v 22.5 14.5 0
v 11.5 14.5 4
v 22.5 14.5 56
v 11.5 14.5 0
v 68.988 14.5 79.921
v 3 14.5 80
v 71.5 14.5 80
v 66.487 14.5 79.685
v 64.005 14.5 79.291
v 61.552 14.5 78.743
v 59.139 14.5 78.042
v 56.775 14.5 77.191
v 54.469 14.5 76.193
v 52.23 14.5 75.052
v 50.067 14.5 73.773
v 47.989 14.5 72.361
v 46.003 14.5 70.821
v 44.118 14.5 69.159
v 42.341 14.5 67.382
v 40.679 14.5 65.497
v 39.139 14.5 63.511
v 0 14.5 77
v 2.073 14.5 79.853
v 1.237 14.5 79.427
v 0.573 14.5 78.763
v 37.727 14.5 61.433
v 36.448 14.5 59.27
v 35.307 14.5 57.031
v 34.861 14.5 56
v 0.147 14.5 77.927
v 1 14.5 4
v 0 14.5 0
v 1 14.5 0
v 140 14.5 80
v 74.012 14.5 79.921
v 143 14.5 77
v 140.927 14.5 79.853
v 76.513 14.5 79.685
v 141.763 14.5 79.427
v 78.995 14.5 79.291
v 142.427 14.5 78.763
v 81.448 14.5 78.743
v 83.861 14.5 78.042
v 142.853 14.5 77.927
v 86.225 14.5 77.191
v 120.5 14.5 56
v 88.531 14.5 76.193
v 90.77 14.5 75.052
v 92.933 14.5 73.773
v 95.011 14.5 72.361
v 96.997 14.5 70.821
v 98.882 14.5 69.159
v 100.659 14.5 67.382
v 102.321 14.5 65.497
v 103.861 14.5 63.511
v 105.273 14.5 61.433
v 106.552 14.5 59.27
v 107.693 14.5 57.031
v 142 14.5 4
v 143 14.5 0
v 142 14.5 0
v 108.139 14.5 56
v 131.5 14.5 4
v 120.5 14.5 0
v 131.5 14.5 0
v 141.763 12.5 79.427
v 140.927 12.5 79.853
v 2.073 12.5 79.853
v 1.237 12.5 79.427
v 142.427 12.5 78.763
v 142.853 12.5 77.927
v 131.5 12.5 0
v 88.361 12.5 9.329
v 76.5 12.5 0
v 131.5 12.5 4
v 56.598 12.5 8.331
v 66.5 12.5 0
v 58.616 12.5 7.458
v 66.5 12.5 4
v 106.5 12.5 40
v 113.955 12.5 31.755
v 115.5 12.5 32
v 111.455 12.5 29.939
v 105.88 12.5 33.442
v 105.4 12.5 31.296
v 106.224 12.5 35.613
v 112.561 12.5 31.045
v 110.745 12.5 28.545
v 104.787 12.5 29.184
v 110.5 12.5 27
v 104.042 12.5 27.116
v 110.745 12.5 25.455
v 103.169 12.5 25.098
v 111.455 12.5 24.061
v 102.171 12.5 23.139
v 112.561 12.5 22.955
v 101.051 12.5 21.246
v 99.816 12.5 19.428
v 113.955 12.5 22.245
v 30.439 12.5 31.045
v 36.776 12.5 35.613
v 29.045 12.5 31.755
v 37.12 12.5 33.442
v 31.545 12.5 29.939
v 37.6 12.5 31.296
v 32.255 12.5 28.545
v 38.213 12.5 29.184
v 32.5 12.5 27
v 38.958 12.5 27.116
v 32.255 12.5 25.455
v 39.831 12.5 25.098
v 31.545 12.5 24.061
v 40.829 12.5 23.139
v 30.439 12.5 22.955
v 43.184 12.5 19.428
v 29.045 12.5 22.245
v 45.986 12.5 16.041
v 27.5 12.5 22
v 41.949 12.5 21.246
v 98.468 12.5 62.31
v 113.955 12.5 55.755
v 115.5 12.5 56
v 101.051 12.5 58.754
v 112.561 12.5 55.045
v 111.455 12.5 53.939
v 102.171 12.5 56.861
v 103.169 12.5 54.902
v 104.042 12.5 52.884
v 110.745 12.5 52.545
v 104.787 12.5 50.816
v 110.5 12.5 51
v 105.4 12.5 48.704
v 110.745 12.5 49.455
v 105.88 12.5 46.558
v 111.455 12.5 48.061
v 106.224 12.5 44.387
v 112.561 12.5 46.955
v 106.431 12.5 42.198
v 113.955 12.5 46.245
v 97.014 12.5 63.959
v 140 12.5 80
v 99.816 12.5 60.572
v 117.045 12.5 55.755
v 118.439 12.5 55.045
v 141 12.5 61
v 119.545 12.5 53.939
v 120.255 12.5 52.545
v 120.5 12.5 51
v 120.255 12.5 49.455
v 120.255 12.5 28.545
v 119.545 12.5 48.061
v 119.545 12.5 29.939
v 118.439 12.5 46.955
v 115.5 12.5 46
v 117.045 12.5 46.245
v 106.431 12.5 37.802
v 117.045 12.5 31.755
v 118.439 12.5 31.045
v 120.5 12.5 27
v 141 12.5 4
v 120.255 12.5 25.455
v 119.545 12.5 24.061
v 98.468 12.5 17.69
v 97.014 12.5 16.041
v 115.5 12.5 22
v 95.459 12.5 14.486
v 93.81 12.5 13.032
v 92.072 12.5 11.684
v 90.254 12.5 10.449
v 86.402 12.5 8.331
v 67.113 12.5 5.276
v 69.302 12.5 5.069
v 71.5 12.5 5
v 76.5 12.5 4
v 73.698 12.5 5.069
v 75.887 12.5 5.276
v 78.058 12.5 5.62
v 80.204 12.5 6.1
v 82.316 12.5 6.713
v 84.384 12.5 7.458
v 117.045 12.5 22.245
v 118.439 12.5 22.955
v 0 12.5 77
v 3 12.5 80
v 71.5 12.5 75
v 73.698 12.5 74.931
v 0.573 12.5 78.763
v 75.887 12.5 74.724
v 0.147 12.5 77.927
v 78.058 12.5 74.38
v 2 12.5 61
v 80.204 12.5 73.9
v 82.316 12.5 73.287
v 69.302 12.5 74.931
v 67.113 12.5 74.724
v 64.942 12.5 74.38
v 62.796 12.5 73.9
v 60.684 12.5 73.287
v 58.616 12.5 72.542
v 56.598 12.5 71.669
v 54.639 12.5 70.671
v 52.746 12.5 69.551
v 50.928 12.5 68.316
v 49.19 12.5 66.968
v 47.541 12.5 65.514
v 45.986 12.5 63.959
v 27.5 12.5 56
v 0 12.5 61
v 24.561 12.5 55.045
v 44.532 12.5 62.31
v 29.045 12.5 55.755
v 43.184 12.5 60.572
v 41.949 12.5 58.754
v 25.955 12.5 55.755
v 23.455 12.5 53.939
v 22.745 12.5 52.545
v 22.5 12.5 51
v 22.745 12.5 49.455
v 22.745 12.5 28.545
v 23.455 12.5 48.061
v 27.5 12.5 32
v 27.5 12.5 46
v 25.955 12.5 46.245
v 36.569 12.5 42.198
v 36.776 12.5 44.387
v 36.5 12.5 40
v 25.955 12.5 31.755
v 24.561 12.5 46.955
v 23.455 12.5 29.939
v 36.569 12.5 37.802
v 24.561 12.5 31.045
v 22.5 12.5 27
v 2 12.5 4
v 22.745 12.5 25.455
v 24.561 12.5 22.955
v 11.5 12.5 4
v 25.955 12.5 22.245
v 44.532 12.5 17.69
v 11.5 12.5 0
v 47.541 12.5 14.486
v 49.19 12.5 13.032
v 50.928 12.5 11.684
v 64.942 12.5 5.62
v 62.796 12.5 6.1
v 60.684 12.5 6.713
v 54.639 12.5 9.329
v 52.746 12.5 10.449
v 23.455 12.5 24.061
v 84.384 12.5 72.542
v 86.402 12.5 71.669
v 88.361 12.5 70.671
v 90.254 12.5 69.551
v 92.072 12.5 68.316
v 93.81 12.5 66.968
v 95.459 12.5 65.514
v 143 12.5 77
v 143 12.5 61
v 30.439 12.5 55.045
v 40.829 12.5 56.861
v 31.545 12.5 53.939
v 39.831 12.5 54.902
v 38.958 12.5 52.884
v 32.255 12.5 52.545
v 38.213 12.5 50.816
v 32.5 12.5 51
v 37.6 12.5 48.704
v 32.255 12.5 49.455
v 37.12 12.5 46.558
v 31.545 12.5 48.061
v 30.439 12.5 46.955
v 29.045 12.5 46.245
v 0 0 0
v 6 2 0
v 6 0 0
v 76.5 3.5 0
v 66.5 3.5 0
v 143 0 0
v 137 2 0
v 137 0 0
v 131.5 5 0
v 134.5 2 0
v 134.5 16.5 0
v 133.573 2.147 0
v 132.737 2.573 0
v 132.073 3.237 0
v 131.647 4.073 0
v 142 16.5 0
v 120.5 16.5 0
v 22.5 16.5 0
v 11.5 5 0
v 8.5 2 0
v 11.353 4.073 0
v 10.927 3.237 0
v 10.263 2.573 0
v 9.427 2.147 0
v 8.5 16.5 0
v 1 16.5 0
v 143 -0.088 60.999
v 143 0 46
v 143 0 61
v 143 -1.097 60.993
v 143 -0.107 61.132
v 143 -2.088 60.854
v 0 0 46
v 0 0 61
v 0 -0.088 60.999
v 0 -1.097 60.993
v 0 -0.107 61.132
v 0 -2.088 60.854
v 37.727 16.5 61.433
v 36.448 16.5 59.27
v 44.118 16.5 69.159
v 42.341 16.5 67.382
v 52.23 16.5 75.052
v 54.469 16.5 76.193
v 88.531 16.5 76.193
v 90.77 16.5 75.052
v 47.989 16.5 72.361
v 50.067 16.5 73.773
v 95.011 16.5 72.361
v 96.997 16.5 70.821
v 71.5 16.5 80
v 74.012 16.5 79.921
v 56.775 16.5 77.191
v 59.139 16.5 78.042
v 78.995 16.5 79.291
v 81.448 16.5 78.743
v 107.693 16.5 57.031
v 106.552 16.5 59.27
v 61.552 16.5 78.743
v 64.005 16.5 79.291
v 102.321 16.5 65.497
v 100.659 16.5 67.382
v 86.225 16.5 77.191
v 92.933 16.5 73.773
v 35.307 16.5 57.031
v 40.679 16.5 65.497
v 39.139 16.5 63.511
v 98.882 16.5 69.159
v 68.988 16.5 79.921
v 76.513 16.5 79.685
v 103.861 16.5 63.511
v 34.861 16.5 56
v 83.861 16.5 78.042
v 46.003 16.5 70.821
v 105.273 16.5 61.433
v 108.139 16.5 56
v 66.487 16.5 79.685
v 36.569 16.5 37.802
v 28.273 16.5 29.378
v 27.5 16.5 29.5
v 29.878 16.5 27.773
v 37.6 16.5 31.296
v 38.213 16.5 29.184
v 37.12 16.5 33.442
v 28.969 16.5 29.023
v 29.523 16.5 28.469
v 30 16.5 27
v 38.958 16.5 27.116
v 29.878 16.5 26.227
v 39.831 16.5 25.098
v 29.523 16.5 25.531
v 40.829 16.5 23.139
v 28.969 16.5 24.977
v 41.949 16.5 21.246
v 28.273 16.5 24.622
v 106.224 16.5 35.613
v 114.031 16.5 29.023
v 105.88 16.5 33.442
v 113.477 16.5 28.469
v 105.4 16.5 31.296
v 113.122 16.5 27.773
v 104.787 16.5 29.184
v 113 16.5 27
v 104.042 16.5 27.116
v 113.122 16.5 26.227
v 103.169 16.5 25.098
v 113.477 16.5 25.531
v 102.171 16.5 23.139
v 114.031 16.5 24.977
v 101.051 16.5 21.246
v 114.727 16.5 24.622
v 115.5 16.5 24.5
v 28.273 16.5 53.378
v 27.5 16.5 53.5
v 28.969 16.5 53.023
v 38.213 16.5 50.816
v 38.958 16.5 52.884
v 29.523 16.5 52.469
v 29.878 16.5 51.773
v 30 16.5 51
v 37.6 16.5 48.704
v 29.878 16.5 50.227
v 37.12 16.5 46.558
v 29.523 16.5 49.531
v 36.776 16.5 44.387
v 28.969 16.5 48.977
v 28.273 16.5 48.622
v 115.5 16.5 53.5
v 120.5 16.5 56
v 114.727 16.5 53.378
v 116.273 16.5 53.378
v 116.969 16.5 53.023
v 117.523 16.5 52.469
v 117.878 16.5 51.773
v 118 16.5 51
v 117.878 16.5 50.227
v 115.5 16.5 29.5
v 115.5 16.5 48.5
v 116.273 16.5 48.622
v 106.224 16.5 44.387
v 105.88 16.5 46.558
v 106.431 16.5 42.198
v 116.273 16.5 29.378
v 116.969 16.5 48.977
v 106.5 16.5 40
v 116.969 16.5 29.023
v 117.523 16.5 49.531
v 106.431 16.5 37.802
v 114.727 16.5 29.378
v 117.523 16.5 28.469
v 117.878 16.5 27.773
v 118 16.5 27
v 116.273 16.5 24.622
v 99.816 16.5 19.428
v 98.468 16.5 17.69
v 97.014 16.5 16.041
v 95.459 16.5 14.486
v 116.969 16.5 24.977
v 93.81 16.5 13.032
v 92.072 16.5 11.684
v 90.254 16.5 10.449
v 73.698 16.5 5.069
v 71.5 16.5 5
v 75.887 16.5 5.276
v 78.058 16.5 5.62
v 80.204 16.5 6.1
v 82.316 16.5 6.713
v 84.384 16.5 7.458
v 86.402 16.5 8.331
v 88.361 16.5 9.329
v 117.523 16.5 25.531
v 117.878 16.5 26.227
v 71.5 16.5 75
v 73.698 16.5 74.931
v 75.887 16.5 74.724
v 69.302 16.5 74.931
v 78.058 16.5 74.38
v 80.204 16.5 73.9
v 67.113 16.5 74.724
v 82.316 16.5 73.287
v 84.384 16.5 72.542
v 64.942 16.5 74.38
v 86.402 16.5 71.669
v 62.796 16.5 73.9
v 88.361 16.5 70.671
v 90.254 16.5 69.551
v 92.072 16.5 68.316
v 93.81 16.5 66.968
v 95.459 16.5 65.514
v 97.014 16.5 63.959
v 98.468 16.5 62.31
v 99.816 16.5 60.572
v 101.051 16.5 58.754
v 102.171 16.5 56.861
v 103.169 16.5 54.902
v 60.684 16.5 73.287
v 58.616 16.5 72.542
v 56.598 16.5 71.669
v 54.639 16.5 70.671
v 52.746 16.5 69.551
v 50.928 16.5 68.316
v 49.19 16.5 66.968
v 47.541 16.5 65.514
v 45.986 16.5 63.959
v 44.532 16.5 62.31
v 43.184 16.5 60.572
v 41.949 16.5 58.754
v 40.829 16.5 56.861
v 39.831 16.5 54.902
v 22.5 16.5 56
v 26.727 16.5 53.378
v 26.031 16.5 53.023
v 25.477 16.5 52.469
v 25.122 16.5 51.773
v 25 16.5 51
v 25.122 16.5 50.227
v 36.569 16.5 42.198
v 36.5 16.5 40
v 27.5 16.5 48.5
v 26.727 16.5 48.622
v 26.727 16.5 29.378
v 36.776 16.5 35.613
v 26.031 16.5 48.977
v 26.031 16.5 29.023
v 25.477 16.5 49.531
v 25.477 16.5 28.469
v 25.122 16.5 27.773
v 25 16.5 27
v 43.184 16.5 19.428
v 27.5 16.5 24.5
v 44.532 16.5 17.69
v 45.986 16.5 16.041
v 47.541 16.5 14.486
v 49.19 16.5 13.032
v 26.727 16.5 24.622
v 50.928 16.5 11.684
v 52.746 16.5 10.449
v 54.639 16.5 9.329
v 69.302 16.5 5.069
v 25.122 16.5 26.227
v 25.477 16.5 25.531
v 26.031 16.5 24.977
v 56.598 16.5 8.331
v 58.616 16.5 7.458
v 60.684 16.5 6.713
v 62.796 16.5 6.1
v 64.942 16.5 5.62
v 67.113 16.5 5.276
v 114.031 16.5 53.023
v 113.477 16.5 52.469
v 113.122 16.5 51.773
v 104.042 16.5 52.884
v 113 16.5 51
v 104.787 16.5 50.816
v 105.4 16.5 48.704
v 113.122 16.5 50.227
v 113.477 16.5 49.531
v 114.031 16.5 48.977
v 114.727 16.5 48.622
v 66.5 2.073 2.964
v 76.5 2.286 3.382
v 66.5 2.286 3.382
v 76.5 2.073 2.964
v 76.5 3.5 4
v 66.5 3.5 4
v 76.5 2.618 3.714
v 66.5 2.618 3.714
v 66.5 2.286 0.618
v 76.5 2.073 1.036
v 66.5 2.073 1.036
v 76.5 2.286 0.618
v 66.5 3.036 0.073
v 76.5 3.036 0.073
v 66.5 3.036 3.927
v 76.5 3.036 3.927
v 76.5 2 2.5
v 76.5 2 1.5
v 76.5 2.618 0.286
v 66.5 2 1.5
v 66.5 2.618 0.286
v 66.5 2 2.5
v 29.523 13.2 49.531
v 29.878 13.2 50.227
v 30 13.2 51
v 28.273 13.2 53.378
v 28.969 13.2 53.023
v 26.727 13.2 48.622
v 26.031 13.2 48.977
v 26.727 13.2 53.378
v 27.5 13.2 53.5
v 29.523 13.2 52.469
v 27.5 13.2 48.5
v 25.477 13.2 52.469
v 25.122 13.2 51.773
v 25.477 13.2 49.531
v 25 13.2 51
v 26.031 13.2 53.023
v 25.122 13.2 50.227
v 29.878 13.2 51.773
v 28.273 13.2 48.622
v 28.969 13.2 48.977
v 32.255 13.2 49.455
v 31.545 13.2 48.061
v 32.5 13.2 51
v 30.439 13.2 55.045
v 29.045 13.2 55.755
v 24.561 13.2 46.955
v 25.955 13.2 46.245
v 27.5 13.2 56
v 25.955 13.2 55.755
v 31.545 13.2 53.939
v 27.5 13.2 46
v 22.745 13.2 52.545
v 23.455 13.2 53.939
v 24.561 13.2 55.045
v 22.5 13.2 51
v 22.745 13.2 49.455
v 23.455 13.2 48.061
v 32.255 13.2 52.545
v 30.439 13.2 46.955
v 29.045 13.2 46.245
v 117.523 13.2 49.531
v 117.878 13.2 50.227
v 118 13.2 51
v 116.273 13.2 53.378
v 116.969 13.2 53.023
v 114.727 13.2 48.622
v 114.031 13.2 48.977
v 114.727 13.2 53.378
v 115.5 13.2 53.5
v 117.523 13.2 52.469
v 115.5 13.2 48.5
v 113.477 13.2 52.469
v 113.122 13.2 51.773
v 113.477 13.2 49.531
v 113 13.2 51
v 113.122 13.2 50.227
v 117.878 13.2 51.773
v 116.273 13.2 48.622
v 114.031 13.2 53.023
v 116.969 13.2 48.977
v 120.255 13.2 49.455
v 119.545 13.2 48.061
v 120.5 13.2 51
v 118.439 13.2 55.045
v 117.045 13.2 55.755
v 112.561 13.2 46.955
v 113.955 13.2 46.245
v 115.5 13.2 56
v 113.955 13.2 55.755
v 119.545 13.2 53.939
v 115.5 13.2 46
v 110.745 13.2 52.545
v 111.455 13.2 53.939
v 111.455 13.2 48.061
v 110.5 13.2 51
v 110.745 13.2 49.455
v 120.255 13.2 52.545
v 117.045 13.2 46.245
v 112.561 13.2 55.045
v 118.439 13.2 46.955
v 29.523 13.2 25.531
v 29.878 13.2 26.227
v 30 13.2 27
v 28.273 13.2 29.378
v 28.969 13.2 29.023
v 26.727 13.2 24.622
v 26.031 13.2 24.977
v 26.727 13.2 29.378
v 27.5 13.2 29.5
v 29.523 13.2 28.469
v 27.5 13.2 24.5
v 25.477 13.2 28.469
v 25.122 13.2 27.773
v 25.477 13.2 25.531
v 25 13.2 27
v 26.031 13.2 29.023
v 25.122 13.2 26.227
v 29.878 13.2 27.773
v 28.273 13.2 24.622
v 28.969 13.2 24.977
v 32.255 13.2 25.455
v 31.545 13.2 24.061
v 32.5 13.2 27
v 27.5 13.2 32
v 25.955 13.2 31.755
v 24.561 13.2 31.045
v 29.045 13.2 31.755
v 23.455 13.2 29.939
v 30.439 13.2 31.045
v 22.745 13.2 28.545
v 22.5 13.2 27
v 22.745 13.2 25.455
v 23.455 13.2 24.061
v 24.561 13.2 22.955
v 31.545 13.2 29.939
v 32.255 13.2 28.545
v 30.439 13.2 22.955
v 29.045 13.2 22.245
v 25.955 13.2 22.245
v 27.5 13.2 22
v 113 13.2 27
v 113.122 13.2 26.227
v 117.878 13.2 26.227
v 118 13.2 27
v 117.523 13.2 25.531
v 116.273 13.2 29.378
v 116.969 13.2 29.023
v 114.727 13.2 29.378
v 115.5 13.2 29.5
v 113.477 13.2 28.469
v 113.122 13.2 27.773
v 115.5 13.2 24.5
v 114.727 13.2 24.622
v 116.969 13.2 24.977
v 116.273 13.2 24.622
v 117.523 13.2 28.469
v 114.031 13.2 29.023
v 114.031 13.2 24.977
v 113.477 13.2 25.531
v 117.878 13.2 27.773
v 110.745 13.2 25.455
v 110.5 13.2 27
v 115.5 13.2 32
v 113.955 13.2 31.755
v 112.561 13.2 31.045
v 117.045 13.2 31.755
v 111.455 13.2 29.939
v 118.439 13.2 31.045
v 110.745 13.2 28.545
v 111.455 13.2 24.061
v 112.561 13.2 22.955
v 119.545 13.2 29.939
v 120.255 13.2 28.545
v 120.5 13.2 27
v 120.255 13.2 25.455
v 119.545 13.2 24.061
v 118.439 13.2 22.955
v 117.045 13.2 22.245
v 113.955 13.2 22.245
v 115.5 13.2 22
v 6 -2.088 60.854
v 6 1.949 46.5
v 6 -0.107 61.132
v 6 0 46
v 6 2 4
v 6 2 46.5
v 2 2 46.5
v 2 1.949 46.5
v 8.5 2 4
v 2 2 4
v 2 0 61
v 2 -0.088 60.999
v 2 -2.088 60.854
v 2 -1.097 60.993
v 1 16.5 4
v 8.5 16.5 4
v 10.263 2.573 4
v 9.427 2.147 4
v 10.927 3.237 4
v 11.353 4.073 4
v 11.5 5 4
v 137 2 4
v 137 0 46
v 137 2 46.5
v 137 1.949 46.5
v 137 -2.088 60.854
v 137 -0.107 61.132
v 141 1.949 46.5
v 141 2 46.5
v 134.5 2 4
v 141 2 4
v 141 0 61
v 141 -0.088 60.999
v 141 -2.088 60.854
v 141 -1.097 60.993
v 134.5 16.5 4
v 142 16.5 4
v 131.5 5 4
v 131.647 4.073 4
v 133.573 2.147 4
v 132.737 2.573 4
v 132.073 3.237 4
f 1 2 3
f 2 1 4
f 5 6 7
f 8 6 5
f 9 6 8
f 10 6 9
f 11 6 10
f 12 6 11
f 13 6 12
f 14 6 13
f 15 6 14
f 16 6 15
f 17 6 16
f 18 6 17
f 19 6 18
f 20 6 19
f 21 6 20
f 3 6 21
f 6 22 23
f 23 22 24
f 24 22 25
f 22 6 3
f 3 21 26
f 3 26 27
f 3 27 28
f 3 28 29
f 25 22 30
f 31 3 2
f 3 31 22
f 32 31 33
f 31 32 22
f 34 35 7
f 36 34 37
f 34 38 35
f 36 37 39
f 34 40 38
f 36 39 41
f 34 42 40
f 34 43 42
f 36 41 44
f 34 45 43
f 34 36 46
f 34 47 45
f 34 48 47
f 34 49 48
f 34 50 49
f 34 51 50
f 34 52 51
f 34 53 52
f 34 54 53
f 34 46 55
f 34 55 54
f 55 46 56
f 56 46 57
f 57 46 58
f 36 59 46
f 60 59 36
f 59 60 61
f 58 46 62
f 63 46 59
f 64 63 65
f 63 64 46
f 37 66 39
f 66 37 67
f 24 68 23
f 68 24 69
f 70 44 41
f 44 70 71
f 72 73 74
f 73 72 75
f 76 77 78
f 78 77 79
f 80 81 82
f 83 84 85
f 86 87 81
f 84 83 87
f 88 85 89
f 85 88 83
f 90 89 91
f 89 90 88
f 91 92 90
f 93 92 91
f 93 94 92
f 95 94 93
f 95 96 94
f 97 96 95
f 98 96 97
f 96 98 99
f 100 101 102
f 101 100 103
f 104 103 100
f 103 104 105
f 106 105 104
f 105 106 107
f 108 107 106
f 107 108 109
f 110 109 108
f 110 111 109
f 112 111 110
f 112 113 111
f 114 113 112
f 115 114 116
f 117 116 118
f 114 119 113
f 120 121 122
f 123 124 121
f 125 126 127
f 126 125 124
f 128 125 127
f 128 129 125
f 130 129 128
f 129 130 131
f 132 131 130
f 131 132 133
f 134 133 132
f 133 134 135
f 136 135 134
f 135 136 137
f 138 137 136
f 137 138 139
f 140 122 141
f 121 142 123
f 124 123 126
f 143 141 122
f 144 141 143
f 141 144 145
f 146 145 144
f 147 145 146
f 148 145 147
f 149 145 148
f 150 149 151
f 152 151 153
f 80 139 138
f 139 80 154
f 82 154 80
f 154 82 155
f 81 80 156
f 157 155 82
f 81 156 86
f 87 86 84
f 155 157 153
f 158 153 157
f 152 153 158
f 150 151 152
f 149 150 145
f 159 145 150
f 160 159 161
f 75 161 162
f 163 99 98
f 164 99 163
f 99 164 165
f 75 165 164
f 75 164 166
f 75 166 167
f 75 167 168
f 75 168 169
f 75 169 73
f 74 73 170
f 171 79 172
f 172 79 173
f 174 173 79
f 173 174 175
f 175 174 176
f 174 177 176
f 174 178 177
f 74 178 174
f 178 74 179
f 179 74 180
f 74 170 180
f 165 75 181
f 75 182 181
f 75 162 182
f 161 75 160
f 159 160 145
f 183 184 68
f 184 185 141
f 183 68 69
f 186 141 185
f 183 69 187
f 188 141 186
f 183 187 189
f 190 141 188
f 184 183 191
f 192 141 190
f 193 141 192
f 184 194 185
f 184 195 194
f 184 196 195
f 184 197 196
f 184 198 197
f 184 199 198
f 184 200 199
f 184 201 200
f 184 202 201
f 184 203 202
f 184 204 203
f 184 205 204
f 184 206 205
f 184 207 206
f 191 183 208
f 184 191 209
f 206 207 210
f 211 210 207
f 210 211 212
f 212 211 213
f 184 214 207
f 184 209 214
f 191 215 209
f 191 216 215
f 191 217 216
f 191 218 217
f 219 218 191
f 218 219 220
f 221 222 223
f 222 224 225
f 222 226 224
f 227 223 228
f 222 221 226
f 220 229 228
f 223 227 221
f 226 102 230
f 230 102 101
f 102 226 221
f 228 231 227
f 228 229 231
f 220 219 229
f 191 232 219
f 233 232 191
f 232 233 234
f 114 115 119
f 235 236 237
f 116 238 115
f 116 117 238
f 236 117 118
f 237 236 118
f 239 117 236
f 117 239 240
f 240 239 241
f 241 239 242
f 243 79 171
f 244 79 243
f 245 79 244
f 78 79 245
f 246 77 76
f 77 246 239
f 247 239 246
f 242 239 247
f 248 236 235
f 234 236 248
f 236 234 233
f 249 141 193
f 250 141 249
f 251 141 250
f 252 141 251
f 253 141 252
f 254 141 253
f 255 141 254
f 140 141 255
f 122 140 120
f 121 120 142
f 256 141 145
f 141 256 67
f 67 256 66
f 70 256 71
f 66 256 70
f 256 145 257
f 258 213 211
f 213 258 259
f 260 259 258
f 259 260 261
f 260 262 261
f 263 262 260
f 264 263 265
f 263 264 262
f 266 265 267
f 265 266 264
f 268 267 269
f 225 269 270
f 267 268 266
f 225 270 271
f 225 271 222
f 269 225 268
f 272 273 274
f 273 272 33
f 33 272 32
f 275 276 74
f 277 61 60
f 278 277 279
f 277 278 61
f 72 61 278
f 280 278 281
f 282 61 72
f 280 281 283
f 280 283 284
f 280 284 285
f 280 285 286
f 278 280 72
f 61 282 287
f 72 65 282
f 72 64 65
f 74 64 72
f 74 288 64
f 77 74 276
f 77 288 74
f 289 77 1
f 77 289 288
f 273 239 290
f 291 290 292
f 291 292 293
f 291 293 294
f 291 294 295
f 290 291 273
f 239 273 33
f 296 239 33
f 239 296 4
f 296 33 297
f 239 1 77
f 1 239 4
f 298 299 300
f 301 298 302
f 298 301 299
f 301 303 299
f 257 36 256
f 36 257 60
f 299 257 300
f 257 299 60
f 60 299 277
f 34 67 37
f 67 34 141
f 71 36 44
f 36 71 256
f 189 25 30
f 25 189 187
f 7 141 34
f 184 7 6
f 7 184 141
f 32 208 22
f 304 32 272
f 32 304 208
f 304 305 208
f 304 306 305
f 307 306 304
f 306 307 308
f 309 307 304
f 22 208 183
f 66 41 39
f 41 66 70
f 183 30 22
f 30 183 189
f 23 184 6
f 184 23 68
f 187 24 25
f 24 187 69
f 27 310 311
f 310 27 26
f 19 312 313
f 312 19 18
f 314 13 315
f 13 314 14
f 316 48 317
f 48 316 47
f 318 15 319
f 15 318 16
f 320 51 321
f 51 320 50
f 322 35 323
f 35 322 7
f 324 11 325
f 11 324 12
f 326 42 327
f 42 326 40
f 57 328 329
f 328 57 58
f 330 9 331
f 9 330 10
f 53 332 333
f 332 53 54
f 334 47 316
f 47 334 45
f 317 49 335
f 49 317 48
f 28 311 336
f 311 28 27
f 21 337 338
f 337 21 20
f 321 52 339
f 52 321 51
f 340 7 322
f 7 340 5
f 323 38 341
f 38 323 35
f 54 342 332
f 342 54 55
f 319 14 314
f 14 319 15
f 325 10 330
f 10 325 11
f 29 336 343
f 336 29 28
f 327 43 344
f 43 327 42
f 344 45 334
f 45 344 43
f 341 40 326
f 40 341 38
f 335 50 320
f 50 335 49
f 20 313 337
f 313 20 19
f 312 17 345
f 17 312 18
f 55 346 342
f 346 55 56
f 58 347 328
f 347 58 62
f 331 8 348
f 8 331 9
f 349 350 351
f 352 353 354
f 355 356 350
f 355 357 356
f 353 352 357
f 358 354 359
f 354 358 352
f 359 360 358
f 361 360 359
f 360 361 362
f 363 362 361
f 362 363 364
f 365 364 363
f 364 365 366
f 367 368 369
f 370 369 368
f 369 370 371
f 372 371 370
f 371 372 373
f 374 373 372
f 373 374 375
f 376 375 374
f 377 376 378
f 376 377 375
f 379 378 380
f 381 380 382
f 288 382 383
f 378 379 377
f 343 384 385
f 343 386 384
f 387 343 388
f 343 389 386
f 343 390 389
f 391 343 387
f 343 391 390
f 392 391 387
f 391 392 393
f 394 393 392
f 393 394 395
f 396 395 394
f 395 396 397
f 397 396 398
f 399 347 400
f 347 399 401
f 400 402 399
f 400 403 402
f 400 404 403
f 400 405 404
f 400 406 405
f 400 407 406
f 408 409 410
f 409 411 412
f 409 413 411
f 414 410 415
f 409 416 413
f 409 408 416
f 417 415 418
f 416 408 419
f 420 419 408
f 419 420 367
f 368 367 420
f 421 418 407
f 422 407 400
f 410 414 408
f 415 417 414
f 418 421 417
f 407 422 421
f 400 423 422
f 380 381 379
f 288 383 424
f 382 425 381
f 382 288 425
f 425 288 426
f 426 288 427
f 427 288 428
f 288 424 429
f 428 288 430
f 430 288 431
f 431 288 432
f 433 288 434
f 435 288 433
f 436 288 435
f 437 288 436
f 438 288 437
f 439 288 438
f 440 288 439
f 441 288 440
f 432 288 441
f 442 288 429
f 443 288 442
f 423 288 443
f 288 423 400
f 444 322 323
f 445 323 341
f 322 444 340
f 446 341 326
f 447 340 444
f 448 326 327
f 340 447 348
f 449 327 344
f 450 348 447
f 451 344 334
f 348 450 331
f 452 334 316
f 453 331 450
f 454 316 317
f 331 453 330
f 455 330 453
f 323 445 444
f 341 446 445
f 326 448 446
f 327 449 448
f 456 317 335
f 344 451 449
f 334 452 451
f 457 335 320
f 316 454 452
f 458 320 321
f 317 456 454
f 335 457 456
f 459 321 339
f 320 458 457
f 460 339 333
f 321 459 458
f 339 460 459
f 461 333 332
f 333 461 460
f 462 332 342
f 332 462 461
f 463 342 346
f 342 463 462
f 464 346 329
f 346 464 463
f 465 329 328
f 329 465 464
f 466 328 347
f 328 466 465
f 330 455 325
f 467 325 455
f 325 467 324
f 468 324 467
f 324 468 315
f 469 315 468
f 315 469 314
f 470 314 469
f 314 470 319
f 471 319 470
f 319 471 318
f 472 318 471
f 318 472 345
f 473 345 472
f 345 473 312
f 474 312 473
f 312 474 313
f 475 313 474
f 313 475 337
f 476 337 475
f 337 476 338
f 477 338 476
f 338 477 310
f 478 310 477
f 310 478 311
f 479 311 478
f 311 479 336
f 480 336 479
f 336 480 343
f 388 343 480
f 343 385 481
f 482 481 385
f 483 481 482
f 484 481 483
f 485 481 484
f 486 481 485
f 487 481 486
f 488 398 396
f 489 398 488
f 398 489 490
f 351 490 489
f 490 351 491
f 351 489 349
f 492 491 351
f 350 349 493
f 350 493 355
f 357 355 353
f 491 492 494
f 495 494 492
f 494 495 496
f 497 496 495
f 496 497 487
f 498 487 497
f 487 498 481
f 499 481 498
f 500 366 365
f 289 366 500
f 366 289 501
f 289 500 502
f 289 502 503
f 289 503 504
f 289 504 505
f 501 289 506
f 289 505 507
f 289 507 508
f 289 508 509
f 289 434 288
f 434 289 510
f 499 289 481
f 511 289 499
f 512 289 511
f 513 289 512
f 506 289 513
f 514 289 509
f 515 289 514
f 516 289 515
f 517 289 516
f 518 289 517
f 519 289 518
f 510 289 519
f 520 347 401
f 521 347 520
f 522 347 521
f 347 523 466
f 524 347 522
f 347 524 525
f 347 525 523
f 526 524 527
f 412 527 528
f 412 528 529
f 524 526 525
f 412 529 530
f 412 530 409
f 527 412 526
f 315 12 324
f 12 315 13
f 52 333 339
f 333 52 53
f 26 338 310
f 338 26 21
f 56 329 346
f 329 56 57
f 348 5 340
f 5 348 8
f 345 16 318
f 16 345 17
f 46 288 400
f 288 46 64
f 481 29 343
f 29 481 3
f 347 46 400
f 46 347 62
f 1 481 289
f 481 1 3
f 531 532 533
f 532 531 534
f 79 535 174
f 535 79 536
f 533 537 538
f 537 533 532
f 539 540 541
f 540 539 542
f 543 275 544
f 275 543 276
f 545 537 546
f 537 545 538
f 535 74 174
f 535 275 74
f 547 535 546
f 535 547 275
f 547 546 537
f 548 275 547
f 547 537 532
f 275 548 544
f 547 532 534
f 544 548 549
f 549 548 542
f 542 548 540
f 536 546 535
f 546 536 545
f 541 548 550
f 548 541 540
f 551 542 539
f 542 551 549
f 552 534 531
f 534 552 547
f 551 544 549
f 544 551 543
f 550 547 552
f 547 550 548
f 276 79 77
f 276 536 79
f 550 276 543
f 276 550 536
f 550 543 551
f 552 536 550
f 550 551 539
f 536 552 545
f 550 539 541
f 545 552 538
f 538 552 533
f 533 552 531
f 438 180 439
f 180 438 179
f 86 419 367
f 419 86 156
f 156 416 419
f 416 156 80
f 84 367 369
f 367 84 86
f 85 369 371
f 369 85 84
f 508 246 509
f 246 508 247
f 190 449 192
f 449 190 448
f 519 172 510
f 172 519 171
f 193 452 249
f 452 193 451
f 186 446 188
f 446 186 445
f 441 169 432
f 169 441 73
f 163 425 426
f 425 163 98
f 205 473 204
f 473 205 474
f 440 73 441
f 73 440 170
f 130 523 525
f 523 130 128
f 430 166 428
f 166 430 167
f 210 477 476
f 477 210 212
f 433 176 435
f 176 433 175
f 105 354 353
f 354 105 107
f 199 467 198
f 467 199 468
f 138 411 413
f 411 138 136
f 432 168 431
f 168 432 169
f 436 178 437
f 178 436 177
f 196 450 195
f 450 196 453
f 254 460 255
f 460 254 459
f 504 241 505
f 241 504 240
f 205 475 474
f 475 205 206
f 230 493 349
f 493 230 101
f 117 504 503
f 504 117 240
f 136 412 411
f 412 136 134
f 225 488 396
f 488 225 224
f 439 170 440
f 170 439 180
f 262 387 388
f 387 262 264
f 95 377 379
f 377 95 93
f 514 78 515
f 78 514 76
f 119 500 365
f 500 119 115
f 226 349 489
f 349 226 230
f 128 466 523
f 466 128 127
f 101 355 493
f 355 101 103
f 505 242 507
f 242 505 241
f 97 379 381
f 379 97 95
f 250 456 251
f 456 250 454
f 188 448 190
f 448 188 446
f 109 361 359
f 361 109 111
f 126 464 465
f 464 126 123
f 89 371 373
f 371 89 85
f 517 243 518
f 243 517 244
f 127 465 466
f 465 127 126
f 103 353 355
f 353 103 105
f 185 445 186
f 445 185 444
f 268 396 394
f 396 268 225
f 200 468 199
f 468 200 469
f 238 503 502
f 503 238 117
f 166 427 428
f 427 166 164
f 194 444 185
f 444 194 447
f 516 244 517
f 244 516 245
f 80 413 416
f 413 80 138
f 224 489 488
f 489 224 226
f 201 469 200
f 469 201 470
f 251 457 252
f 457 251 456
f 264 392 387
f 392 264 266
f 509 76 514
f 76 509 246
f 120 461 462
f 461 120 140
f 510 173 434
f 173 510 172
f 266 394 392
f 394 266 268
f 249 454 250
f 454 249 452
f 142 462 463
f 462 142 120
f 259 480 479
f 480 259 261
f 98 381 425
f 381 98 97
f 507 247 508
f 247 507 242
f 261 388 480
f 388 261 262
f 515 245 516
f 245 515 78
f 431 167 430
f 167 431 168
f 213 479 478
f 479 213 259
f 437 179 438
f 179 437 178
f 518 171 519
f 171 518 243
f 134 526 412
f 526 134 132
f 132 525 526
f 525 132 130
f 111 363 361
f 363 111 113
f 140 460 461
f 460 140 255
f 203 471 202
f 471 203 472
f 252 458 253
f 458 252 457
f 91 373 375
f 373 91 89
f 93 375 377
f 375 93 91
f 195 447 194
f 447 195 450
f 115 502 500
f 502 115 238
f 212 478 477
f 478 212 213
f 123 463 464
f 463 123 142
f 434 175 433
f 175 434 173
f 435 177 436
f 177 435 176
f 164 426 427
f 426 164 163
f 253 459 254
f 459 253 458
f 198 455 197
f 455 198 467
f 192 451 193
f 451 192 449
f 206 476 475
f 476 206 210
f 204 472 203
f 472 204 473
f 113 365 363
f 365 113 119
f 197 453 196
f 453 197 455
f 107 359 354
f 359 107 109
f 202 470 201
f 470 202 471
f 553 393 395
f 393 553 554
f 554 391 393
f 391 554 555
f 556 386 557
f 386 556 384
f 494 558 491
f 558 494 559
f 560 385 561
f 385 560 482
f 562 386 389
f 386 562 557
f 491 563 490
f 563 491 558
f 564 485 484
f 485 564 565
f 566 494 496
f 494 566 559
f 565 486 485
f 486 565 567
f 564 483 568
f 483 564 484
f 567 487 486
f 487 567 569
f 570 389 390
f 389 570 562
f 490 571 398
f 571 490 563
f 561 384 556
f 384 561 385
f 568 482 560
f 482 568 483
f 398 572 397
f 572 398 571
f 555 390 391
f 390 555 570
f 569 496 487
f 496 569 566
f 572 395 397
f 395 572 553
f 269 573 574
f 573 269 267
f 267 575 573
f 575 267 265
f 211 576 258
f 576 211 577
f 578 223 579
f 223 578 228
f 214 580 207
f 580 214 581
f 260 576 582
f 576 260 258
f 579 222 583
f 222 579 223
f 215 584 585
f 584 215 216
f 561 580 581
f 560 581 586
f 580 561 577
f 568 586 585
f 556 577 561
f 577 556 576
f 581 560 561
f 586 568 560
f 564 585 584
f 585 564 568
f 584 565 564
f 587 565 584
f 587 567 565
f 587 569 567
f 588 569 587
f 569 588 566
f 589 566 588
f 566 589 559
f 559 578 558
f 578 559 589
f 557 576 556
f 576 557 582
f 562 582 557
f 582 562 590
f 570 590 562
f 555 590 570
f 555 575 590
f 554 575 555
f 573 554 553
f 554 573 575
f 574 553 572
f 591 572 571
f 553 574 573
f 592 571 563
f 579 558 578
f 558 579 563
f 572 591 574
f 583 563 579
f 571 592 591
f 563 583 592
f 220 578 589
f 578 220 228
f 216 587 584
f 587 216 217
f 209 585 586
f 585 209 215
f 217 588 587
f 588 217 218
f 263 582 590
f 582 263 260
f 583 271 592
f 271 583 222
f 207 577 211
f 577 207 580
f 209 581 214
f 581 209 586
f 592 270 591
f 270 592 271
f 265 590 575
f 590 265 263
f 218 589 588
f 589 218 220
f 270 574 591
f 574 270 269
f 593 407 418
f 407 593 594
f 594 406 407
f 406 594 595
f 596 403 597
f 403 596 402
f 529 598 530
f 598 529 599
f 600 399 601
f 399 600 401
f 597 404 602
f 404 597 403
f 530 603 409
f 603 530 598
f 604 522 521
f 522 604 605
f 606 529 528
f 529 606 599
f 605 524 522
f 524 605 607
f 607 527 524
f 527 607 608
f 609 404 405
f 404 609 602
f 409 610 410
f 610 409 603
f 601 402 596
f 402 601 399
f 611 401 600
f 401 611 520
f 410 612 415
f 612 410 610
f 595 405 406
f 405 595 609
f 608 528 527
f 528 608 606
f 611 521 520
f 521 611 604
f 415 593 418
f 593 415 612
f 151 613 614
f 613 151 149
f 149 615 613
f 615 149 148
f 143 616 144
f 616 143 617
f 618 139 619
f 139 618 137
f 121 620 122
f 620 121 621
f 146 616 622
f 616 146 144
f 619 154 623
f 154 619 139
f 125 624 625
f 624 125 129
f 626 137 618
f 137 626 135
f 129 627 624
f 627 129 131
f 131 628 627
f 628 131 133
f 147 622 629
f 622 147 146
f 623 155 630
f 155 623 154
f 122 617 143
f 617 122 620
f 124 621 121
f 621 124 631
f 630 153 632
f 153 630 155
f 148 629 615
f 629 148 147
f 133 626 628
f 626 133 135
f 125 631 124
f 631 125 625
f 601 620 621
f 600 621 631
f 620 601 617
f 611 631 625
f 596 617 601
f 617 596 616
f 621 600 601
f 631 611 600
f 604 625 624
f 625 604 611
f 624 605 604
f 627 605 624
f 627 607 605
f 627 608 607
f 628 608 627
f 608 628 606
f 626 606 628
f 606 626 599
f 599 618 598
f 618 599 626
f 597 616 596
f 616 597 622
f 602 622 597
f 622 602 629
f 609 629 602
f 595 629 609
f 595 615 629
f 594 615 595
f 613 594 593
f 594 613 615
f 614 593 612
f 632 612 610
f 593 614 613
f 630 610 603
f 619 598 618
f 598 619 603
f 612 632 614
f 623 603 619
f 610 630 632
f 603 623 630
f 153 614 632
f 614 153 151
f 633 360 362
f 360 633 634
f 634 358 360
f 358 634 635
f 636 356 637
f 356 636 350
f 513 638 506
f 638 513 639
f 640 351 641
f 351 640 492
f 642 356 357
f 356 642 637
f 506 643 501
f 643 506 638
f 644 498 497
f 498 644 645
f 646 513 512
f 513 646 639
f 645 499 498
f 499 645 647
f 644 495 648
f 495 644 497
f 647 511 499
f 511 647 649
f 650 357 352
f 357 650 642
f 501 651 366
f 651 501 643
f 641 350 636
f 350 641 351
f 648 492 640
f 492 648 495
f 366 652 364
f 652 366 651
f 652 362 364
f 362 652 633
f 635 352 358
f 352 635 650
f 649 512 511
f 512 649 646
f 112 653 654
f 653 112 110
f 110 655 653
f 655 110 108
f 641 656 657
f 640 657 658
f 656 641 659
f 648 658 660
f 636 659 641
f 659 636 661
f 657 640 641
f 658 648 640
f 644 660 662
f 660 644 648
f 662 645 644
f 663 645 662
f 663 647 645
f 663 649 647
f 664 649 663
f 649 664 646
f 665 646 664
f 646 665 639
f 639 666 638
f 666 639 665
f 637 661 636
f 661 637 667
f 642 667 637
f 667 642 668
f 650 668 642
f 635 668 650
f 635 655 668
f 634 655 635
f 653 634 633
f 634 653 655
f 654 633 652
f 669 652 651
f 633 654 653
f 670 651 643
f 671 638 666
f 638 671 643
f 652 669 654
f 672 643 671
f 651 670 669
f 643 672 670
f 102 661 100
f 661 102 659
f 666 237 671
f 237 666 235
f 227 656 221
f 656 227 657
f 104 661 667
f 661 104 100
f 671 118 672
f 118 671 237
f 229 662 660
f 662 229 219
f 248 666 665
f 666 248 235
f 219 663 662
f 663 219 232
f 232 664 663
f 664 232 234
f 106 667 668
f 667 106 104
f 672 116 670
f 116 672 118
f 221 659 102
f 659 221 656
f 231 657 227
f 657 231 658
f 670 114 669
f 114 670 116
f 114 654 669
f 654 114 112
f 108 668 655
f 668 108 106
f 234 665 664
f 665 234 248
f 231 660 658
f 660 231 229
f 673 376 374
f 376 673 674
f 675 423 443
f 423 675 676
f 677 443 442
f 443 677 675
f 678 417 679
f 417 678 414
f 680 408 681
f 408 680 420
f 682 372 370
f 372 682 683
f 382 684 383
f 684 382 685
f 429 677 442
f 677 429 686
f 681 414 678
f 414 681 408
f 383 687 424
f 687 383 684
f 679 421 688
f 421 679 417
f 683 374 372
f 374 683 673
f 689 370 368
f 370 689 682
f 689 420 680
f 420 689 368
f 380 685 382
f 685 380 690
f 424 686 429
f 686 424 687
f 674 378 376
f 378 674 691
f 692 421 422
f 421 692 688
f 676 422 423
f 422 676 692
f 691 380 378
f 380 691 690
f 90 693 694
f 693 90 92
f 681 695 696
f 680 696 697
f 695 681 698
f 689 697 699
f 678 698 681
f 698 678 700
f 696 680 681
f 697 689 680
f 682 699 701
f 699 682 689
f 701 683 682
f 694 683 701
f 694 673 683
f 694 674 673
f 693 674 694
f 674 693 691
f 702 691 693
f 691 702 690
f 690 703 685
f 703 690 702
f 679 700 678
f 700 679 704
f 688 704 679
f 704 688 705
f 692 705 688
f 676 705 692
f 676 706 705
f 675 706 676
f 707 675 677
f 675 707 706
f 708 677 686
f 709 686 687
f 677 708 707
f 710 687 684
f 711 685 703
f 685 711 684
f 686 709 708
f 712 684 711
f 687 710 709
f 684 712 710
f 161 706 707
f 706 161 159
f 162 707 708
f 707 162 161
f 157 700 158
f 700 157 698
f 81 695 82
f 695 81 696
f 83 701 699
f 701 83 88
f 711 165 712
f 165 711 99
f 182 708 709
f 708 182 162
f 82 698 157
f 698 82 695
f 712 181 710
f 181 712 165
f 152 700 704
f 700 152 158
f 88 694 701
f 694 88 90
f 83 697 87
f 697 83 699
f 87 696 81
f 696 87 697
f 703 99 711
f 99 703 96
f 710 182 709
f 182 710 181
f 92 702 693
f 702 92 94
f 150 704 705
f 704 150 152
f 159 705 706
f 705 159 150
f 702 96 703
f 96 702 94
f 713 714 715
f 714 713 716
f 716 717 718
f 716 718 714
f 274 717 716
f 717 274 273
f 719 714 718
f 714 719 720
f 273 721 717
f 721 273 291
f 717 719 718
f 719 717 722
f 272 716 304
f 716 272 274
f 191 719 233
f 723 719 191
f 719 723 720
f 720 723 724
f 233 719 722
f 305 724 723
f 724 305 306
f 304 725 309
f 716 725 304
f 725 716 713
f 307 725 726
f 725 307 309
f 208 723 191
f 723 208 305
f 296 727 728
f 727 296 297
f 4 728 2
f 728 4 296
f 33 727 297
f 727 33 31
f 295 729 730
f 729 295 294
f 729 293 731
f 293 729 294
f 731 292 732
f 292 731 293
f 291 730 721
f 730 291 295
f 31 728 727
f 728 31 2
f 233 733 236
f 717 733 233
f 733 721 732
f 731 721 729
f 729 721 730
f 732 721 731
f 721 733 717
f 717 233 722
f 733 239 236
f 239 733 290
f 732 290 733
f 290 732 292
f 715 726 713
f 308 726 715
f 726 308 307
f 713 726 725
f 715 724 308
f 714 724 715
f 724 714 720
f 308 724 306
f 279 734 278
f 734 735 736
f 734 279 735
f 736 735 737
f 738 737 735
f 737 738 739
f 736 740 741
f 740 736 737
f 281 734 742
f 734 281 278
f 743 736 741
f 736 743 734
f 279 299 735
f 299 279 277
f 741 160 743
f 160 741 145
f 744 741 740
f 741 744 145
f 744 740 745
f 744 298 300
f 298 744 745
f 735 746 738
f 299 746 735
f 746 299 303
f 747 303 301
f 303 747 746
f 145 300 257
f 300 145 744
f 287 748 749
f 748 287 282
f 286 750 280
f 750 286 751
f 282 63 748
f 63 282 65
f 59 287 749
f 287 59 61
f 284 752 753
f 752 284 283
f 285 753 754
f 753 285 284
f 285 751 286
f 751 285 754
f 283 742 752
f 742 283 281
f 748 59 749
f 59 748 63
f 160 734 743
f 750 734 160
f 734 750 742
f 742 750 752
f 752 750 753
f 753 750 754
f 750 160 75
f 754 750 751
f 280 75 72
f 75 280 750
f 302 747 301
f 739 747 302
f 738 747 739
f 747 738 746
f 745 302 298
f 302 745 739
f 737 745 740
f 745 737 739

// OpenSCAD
// Measure your phone length (round up to nearest mm)
length = 138;

// Measure your phone width (round up to nearest mm)
width=69;

// Measure your phone depth (round up to nearest mm)
depth=9;

module case(length,width,depth) {
    real_length = length + 5;
    real_width = width < 70 ? 80 : width + 10;
    real_depth = depth + 5.5;
    back(real_length, real_width, real_depth);
    side(real_width, real_depth);
    translate([real_length,0,0]) mirror([1,0,0]) side(real_width, real_depth);
}

module back(length, width, depth) {
    difference() {
        union() {
            hull() {
                translate([3,depth-2,width-3]) rotate([-90,0,0]) cylinder(2,3,3,$fn=20);
                translate([length-3,depth-2,width-3]) rotate([-90,0,0]) cylinder(2,3,3,$fn=20);
                translate([0,depth-2,0]) cube([length,2,1]);
            }
            translate([length/2,depth-2,width/2]) rotate([-90,0,0]) cylinder(4,40,40,$fn=100);
            translate([length/2-98/2,depth-2,0]) cube([98,4,width/2+16]);
            hull() {
                translate([length/2-10/2,3.5,0]) cube([10,depth-3,4]);
                translate([length/2-10/2,3.5,1.5]) rotate([0,90,0]) cylinder(10,1.5,1.5,$fn=20);
                translate([length/2-10/2,3.5,4-1.5]) rotate([0,90,0]) cylinder(10,1.5,1.5,$fn=20);
            }
        }
        translate([length/2,depth-3,width/2]) rotate([-90,0,0]) cylinder(7,35,35,$fn=100);
        translate([length/2-44,depth-4,width/2+11]) rotate([-90,0,0]) cylinder(7,2.5,2.5,$fn=20);
        translate([length/2-44,depth-4,width/2+11]) rotate([-90,0,0]) cylinder(2.7,5,5,$fn=20);
        translate([length/2+44,depth-4,width/2+11]) rotate([-90,0,0]) cylinder(7,2.5,2.5,$fn=20);
        translate([length/2+44,depth-4,width/2+11]) rotate([-90,0,0]) cylinder(2.7,5,5,$fn=20);

        translate([length/2-44,depth-4,width/2-13]) rotate([-90,0,0]) cylinder(7,2.5,2.5,$fn=20);
        translate([length/2-44,depth-4,width/2-13]) rotate([-90,0,0]) cylinder(2.7,5,5,$fn=20);
        translate([length/2+44,depth-4,width/2-13]) rotate([-90,0,0]) cylinder(7,2.5,2.5,$fn=20);
        translate([length/2+44,depth-4,width/2-13]) rotate([-90,0,0]) cylinder(2.7,5,5,$fn=20);
    }
}

module side(width, depth) {
    cube([6,2,width/2+6.5]);
    cube([2,depth,width/2+6.5]);
    hull() {
        translate([0,0,width/2+6]) cube([2,depth,15]);
        translate([0,0,width/2+6]) rotate([8,0,0]) cube([2,1,15]);
    }
    hull() {
        translate([1,5,0]) cube([10.5,depth-5,4]);
        translate([1,2,0]) cube([7.5,14.5,4]);
        translate([8.5,5,0]) cylinder(4,3,3,$fn=20);
    }
    translate([0,0,width/2+6]) rotate([8,0,0]) cube([6,2,15]);
}

case(length,width,depth);
